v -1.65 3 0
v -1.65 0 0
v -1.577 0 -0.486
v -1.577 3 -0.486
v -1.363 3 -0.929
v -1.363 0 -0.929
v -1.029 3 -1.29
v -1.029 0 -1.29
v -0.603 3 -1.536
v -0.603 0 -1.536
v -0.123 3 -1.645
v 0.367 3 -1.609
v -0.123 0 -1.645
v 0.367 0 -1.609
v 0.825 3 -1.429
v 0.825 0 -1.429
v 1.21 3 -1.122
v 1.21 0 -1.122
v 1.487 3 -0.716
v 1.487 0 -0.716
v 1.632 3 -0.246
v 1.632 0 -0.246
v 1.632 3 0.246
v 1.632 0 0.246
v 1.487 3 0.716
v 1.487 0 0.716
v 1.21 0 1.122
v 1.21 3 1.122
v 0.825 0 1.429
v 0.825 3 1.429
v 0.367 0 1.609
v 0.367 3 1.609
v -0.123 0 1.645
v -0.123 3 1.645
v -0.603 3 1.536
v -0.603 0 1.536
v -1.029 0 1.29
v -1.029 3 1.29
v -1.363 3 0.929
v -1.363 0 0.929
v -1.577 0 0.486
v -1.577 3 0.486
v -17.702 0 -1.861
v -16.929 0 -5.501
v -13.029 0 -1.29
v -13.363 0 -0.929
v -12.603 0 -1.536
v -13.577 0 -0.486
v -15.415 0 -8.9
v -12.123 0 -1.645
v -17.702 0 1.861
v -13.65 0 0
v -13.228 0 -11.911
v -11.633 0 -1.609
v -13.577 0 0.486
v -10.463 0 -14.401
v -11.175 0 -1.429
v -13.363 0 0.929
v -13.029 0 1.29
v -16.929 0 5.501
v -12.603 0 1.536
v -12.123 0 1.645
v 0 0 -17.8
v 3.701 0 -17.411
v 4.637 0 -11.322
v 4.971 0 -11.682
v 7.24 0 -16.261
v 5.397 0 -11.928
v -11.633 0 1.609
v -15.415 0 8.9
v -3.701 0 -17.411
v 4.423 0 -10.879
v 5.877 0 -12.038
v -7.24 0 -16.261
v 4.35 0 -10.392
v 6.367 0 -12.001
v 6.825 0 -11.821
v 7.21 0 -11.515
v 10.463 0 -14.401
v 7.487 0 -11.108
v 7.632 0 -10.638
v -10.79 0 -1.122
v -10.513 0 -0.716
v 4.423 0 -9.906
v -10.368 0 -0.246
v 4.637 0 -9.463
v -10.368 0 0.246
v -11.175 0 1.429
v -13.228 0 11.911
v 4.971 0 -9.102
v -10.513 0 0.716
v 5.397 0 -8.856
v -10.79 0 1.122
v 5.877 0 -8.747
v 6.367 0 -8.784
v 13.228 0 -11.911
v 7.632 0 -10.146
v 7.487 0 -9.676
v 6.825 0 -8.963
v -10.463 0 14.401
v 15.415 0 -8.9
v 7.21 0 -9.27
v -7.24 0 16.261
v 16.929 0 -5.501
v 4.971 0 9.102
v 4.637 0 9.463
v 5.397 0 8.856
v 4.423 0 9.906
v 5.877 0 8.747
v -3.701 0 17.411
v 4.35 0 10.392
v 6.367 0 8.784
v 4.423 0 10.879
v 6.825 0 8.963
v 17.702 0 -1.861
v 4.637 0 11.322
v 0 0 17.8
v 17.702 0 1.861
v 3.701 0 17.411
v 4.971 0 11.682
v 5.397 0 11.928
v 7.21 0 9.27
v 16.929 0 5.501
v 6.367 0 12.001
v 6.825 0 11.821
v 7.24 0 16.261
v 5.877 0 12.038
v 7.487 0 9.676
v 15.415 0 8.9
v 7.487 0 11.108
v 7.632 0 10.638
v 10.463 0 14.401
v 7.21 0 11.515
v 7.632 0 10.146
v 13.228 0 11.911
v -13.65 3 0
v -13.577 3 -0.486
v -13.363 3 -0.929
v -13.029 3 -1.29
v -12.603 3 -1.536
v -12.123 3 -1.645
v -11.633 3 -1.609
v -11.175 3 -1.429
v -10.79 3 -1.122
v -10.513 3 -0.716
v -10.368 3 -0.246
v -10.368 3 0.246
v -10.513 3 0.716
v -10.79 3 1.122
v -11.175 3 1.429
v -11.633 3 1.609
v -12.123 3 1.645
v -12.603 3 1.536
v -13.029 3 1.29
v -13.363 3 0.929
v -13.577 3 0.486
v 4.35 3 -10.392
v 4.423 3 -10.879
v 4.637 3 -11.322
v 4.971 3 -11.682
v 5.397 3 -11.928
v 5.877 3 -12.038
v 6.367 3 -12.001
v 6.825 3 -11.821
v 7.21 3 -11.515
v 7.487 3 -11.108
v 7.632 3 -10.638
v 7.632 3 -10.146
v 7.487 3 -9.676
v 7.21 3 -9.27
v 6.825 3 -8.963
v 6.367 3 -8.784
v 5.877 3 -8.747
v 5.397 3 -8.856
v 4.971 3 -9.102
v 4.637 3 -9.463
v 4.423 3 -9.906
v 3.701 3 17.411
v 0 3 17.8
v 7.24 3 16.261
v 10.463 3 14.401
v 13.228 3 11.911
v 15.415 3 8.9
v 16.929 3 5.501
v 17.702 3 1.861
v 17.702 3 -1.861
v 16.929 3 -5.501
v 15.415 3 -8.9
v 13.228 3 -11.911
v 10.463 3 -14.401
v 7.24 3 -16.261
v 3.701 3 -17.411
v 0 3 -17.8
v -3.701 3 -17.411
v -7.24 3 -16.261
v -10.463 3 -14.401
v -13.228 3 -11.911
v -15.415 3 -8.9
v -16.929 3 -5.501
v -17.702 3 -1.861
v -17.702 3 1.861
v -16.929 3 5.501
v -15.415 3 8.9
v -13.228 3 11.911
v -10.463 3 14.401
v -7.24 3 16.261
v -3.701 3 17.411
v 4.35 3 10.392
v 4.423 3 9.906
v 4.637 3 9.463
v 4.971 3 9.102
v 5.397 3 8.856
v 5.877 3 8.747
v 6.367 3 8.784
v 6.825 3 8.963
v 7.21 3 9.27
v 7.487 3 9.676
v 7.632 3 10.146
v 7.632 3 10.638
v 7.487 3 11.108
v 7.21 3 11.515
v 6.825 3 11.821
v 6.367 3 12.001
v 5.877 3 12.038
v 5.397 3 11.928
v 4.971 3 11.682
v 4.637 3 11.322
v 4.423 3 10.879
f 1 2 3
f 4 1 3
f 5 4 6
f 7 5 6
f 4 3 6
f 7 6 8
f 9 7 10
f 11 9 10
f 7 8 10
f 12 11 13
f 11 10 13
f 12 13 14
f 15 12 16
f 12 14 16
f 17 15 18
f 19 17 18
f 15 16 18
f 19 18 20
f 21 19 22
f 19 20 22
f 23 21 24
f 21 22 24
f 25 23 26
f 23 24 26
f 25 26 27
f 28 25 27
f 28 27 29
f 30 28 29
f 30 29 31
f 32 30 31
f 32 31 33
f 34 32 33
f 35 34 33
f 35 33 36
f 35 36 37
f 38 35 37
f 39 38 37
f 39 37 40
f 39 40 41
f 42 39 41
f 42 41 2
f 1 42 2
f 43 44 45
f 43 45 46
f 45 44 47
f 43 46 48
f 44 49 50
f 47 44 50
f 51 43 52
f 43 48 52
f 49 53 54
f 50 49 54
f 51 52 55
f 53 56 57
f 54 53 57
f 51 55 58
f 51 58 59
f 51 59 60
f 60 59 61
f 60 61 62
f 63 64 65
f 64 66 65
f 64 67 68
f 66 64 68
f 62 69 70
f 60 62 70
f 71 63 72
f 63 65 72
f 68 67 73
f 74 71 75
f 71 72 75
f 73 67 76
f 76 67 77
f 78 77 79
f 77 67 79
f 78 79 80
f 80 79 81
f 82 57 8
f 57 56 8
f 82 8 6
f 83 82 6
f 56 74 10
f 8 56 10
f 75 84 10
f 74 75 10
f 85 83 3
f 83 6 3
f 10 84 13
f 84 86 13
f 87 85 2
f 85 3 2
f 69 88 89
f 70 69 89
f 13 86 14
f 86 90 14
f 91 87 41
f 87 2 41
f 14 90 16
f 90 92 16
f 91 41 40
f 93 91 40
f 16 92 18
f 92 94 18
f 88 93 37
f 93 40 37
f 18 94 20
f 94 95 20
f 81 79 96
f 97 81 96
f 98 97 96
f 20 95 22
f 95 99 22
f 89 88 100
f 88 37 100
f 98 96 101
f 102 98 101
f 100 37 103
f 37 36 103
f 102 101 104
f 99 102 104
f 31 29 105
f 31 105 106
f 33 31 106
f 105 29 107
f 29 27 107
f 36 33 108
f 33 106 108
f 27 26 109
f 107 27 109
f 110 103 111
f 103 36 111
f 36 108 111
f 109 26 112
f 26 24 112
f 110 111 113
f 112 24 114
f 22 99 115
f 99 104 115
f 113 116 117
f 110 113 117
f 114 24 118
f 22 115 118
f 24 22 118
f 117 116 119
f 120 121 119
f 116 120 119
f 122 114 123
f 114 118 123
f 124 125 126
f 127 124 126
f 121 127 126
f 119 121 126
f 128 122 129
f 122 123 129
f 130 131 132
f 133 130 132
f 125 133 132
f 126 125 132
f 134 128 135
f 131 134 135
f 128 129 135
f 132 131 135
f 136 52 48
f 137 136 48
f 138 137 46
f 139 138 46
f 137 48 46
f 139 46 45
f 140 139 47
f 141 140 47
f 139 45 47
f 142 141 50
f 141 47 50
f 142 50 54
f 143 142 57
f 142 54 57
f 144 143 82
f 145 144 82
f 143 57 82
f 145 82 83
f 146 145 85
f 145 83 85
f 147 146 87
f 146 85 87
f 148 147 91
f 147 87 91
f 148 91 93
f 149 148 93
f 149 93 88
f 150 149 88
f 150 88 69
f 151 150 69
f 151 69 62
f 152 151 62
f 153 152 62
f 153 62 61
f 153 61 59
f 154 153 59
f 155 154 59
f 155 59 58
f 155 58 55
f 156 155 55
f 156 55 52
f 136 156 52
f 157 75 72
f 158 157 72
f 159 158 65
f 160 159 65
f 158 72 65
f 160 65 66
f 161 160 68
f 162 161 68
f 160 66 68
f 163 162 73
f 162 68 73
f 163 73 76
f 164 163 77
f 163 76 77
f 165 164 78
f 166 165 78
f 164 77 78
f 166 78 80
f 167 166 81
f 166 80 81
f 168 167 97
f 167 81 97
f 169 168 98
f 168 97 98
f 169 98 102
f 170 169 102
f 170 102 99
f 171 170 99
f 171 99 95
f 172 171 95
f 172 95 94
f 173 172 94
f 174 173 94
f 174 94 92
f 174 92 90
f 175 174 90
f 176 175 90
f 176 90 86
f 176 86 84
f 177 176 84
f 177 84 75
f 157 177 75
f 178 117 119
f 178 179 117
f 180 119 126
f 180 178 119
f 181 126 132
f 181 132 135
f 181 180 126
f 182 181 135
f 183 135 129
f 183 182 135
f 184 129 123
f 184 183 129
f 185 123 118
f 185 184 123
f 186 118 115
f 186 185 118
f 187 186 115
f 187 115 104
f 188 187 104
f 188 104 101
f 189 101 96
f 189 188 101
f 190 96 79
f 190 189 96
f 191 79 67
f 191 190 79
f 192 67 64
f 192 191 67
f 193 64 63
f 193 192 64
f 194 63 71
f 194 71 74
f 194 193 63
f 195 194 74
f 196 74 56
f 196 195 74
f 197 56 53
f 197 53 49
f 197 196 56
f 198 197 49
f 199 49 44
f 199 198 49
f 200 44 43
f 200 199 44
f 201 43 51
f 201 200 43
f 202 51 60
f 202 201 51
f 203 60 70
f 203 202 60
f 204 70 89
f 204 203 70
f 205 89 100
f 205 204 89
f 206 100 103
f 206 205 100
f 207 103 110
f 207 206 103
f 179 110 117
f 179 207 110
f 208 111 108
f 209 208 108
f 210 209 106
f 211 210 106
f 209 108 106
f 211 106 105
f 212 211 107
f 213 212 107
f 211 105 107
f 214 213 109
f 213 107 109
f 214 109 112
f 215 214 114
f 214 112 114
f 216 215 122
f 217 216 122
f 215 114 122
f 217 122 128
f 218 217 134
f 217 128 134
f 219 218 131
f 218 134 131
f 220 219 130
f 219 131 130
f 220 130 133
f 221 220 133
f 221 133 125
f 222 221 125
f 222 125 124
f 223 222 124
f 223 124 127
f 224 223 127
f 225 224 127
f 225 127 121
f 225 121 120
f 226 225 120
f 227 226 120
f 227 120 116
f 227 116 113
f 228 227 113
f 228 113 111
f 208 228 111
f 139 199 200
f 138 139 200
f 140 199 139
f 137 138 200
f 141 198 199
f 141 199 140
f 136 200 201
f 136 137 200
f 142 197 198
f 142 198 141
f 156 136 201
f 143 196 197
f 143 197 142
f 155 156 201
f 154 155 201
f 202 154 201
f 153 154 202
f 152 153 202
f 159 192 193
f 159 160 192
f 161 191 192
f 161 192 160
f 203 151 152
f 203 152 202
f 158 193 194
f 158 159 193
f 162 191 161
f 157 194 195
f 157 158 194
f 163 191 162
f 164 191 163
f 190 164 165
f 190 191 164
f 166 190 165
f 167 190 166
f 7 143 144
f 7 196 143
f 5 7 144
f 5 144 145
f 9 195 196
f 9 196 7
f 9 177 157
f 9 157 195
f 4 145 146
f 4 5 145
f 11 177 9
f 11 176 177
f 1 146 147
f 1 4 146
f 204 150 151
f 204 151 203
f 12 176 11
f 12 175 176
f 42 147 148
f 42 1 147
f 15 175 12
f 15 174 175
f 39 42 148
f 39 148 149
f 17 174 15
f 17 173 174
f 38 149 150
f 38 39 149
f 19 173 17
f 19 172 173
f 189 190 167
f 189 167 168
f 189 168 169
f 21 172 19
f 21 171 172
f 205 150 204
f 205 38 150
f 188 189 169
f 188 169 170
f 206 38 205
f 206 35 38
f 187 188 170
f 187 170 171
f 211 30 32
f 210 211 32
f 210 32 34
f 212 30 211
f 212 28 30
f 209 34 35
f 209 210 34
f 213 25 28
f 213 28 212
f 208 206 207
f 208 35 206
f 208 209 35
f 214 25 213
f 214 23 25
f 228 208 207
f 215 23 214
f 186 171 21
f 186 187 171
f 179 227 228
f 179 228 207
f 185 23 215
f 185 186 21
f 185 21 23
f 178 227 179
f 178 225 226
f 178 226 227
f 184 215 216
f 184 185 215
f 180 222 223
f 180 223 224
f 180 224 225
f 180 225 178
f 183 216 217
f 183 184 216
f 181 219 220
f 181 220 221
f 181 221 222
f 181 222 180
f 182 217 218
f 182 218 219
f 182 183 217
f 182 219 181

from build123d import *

# Parameters (mm, degrees)
SKIZZE1_W                       = 16.8
SKIZZE1_H                       = 3
SKIZZE2_R                       = 1
SCHNITT_LINEAR_AUSTRAGEN1_DEPTH = 26.351134097
KREISMUSTER1_COUNT              = 3
M4_GEWINDEBOHRUNG1_D            = 3.3


with BuildPart() as part:
    # Skizze1 → Rotation1 (revolve)
    with BuildSketch(Plane(origin=(0, 0, 0), x_dir=(0, 0, -1), z_dir=(1, 0, 0))):
        with Locations((-9.4, 1.5)):
            Rectangle(SKIZZE1_W, SKIZZE1_H)
    revolve(axis=Axis((0, 0, 0), (0, 1, 0)))

    # Skizze2 → Schnitt-Linear austragen1 (cut, through all)
    with BuildSketch(Plane(origin=(0, 3, 0), x_dir=(1, 0, 0), z_dir=(0, 1, 0))):
        with Locations((-12, 0)):
            Circle(SKIZZE2_R)
    schnitt_linear_austragen1 = extrude(amount=-SCHNITT_LINEAR_AUSTRAGEN1_DEPTH, mode=Mode.SUBTRACT)

    # Kreismuster1: Schnitt-Linear austragen1 ×3 about axis
    kreismuster1_axis = Axis((0, 3, 0), (0, -1, 0))
    for i in range(1, KREISMUSTER1_COUNT):
        add(schnitt_linear_austragen1.rotate(kreismuster1_axis, i * 360 / KREISMUSTER1_COUNT), mode=Mode.SUBTRACT)

    # M4 Gewindebohrung1 (through all)
    with Locations(Plane(origin=(0, 3, 0), x_dir=(1, 0, 0), z_dir=(0, 1, 0))):
        with Locations((0, 0), (6, 10.392304845), (-12, 0), (6, -10.392304845)):
            Hole(M4_GEWINDEBOHRUNG1_D / 2)


solid = part.part
